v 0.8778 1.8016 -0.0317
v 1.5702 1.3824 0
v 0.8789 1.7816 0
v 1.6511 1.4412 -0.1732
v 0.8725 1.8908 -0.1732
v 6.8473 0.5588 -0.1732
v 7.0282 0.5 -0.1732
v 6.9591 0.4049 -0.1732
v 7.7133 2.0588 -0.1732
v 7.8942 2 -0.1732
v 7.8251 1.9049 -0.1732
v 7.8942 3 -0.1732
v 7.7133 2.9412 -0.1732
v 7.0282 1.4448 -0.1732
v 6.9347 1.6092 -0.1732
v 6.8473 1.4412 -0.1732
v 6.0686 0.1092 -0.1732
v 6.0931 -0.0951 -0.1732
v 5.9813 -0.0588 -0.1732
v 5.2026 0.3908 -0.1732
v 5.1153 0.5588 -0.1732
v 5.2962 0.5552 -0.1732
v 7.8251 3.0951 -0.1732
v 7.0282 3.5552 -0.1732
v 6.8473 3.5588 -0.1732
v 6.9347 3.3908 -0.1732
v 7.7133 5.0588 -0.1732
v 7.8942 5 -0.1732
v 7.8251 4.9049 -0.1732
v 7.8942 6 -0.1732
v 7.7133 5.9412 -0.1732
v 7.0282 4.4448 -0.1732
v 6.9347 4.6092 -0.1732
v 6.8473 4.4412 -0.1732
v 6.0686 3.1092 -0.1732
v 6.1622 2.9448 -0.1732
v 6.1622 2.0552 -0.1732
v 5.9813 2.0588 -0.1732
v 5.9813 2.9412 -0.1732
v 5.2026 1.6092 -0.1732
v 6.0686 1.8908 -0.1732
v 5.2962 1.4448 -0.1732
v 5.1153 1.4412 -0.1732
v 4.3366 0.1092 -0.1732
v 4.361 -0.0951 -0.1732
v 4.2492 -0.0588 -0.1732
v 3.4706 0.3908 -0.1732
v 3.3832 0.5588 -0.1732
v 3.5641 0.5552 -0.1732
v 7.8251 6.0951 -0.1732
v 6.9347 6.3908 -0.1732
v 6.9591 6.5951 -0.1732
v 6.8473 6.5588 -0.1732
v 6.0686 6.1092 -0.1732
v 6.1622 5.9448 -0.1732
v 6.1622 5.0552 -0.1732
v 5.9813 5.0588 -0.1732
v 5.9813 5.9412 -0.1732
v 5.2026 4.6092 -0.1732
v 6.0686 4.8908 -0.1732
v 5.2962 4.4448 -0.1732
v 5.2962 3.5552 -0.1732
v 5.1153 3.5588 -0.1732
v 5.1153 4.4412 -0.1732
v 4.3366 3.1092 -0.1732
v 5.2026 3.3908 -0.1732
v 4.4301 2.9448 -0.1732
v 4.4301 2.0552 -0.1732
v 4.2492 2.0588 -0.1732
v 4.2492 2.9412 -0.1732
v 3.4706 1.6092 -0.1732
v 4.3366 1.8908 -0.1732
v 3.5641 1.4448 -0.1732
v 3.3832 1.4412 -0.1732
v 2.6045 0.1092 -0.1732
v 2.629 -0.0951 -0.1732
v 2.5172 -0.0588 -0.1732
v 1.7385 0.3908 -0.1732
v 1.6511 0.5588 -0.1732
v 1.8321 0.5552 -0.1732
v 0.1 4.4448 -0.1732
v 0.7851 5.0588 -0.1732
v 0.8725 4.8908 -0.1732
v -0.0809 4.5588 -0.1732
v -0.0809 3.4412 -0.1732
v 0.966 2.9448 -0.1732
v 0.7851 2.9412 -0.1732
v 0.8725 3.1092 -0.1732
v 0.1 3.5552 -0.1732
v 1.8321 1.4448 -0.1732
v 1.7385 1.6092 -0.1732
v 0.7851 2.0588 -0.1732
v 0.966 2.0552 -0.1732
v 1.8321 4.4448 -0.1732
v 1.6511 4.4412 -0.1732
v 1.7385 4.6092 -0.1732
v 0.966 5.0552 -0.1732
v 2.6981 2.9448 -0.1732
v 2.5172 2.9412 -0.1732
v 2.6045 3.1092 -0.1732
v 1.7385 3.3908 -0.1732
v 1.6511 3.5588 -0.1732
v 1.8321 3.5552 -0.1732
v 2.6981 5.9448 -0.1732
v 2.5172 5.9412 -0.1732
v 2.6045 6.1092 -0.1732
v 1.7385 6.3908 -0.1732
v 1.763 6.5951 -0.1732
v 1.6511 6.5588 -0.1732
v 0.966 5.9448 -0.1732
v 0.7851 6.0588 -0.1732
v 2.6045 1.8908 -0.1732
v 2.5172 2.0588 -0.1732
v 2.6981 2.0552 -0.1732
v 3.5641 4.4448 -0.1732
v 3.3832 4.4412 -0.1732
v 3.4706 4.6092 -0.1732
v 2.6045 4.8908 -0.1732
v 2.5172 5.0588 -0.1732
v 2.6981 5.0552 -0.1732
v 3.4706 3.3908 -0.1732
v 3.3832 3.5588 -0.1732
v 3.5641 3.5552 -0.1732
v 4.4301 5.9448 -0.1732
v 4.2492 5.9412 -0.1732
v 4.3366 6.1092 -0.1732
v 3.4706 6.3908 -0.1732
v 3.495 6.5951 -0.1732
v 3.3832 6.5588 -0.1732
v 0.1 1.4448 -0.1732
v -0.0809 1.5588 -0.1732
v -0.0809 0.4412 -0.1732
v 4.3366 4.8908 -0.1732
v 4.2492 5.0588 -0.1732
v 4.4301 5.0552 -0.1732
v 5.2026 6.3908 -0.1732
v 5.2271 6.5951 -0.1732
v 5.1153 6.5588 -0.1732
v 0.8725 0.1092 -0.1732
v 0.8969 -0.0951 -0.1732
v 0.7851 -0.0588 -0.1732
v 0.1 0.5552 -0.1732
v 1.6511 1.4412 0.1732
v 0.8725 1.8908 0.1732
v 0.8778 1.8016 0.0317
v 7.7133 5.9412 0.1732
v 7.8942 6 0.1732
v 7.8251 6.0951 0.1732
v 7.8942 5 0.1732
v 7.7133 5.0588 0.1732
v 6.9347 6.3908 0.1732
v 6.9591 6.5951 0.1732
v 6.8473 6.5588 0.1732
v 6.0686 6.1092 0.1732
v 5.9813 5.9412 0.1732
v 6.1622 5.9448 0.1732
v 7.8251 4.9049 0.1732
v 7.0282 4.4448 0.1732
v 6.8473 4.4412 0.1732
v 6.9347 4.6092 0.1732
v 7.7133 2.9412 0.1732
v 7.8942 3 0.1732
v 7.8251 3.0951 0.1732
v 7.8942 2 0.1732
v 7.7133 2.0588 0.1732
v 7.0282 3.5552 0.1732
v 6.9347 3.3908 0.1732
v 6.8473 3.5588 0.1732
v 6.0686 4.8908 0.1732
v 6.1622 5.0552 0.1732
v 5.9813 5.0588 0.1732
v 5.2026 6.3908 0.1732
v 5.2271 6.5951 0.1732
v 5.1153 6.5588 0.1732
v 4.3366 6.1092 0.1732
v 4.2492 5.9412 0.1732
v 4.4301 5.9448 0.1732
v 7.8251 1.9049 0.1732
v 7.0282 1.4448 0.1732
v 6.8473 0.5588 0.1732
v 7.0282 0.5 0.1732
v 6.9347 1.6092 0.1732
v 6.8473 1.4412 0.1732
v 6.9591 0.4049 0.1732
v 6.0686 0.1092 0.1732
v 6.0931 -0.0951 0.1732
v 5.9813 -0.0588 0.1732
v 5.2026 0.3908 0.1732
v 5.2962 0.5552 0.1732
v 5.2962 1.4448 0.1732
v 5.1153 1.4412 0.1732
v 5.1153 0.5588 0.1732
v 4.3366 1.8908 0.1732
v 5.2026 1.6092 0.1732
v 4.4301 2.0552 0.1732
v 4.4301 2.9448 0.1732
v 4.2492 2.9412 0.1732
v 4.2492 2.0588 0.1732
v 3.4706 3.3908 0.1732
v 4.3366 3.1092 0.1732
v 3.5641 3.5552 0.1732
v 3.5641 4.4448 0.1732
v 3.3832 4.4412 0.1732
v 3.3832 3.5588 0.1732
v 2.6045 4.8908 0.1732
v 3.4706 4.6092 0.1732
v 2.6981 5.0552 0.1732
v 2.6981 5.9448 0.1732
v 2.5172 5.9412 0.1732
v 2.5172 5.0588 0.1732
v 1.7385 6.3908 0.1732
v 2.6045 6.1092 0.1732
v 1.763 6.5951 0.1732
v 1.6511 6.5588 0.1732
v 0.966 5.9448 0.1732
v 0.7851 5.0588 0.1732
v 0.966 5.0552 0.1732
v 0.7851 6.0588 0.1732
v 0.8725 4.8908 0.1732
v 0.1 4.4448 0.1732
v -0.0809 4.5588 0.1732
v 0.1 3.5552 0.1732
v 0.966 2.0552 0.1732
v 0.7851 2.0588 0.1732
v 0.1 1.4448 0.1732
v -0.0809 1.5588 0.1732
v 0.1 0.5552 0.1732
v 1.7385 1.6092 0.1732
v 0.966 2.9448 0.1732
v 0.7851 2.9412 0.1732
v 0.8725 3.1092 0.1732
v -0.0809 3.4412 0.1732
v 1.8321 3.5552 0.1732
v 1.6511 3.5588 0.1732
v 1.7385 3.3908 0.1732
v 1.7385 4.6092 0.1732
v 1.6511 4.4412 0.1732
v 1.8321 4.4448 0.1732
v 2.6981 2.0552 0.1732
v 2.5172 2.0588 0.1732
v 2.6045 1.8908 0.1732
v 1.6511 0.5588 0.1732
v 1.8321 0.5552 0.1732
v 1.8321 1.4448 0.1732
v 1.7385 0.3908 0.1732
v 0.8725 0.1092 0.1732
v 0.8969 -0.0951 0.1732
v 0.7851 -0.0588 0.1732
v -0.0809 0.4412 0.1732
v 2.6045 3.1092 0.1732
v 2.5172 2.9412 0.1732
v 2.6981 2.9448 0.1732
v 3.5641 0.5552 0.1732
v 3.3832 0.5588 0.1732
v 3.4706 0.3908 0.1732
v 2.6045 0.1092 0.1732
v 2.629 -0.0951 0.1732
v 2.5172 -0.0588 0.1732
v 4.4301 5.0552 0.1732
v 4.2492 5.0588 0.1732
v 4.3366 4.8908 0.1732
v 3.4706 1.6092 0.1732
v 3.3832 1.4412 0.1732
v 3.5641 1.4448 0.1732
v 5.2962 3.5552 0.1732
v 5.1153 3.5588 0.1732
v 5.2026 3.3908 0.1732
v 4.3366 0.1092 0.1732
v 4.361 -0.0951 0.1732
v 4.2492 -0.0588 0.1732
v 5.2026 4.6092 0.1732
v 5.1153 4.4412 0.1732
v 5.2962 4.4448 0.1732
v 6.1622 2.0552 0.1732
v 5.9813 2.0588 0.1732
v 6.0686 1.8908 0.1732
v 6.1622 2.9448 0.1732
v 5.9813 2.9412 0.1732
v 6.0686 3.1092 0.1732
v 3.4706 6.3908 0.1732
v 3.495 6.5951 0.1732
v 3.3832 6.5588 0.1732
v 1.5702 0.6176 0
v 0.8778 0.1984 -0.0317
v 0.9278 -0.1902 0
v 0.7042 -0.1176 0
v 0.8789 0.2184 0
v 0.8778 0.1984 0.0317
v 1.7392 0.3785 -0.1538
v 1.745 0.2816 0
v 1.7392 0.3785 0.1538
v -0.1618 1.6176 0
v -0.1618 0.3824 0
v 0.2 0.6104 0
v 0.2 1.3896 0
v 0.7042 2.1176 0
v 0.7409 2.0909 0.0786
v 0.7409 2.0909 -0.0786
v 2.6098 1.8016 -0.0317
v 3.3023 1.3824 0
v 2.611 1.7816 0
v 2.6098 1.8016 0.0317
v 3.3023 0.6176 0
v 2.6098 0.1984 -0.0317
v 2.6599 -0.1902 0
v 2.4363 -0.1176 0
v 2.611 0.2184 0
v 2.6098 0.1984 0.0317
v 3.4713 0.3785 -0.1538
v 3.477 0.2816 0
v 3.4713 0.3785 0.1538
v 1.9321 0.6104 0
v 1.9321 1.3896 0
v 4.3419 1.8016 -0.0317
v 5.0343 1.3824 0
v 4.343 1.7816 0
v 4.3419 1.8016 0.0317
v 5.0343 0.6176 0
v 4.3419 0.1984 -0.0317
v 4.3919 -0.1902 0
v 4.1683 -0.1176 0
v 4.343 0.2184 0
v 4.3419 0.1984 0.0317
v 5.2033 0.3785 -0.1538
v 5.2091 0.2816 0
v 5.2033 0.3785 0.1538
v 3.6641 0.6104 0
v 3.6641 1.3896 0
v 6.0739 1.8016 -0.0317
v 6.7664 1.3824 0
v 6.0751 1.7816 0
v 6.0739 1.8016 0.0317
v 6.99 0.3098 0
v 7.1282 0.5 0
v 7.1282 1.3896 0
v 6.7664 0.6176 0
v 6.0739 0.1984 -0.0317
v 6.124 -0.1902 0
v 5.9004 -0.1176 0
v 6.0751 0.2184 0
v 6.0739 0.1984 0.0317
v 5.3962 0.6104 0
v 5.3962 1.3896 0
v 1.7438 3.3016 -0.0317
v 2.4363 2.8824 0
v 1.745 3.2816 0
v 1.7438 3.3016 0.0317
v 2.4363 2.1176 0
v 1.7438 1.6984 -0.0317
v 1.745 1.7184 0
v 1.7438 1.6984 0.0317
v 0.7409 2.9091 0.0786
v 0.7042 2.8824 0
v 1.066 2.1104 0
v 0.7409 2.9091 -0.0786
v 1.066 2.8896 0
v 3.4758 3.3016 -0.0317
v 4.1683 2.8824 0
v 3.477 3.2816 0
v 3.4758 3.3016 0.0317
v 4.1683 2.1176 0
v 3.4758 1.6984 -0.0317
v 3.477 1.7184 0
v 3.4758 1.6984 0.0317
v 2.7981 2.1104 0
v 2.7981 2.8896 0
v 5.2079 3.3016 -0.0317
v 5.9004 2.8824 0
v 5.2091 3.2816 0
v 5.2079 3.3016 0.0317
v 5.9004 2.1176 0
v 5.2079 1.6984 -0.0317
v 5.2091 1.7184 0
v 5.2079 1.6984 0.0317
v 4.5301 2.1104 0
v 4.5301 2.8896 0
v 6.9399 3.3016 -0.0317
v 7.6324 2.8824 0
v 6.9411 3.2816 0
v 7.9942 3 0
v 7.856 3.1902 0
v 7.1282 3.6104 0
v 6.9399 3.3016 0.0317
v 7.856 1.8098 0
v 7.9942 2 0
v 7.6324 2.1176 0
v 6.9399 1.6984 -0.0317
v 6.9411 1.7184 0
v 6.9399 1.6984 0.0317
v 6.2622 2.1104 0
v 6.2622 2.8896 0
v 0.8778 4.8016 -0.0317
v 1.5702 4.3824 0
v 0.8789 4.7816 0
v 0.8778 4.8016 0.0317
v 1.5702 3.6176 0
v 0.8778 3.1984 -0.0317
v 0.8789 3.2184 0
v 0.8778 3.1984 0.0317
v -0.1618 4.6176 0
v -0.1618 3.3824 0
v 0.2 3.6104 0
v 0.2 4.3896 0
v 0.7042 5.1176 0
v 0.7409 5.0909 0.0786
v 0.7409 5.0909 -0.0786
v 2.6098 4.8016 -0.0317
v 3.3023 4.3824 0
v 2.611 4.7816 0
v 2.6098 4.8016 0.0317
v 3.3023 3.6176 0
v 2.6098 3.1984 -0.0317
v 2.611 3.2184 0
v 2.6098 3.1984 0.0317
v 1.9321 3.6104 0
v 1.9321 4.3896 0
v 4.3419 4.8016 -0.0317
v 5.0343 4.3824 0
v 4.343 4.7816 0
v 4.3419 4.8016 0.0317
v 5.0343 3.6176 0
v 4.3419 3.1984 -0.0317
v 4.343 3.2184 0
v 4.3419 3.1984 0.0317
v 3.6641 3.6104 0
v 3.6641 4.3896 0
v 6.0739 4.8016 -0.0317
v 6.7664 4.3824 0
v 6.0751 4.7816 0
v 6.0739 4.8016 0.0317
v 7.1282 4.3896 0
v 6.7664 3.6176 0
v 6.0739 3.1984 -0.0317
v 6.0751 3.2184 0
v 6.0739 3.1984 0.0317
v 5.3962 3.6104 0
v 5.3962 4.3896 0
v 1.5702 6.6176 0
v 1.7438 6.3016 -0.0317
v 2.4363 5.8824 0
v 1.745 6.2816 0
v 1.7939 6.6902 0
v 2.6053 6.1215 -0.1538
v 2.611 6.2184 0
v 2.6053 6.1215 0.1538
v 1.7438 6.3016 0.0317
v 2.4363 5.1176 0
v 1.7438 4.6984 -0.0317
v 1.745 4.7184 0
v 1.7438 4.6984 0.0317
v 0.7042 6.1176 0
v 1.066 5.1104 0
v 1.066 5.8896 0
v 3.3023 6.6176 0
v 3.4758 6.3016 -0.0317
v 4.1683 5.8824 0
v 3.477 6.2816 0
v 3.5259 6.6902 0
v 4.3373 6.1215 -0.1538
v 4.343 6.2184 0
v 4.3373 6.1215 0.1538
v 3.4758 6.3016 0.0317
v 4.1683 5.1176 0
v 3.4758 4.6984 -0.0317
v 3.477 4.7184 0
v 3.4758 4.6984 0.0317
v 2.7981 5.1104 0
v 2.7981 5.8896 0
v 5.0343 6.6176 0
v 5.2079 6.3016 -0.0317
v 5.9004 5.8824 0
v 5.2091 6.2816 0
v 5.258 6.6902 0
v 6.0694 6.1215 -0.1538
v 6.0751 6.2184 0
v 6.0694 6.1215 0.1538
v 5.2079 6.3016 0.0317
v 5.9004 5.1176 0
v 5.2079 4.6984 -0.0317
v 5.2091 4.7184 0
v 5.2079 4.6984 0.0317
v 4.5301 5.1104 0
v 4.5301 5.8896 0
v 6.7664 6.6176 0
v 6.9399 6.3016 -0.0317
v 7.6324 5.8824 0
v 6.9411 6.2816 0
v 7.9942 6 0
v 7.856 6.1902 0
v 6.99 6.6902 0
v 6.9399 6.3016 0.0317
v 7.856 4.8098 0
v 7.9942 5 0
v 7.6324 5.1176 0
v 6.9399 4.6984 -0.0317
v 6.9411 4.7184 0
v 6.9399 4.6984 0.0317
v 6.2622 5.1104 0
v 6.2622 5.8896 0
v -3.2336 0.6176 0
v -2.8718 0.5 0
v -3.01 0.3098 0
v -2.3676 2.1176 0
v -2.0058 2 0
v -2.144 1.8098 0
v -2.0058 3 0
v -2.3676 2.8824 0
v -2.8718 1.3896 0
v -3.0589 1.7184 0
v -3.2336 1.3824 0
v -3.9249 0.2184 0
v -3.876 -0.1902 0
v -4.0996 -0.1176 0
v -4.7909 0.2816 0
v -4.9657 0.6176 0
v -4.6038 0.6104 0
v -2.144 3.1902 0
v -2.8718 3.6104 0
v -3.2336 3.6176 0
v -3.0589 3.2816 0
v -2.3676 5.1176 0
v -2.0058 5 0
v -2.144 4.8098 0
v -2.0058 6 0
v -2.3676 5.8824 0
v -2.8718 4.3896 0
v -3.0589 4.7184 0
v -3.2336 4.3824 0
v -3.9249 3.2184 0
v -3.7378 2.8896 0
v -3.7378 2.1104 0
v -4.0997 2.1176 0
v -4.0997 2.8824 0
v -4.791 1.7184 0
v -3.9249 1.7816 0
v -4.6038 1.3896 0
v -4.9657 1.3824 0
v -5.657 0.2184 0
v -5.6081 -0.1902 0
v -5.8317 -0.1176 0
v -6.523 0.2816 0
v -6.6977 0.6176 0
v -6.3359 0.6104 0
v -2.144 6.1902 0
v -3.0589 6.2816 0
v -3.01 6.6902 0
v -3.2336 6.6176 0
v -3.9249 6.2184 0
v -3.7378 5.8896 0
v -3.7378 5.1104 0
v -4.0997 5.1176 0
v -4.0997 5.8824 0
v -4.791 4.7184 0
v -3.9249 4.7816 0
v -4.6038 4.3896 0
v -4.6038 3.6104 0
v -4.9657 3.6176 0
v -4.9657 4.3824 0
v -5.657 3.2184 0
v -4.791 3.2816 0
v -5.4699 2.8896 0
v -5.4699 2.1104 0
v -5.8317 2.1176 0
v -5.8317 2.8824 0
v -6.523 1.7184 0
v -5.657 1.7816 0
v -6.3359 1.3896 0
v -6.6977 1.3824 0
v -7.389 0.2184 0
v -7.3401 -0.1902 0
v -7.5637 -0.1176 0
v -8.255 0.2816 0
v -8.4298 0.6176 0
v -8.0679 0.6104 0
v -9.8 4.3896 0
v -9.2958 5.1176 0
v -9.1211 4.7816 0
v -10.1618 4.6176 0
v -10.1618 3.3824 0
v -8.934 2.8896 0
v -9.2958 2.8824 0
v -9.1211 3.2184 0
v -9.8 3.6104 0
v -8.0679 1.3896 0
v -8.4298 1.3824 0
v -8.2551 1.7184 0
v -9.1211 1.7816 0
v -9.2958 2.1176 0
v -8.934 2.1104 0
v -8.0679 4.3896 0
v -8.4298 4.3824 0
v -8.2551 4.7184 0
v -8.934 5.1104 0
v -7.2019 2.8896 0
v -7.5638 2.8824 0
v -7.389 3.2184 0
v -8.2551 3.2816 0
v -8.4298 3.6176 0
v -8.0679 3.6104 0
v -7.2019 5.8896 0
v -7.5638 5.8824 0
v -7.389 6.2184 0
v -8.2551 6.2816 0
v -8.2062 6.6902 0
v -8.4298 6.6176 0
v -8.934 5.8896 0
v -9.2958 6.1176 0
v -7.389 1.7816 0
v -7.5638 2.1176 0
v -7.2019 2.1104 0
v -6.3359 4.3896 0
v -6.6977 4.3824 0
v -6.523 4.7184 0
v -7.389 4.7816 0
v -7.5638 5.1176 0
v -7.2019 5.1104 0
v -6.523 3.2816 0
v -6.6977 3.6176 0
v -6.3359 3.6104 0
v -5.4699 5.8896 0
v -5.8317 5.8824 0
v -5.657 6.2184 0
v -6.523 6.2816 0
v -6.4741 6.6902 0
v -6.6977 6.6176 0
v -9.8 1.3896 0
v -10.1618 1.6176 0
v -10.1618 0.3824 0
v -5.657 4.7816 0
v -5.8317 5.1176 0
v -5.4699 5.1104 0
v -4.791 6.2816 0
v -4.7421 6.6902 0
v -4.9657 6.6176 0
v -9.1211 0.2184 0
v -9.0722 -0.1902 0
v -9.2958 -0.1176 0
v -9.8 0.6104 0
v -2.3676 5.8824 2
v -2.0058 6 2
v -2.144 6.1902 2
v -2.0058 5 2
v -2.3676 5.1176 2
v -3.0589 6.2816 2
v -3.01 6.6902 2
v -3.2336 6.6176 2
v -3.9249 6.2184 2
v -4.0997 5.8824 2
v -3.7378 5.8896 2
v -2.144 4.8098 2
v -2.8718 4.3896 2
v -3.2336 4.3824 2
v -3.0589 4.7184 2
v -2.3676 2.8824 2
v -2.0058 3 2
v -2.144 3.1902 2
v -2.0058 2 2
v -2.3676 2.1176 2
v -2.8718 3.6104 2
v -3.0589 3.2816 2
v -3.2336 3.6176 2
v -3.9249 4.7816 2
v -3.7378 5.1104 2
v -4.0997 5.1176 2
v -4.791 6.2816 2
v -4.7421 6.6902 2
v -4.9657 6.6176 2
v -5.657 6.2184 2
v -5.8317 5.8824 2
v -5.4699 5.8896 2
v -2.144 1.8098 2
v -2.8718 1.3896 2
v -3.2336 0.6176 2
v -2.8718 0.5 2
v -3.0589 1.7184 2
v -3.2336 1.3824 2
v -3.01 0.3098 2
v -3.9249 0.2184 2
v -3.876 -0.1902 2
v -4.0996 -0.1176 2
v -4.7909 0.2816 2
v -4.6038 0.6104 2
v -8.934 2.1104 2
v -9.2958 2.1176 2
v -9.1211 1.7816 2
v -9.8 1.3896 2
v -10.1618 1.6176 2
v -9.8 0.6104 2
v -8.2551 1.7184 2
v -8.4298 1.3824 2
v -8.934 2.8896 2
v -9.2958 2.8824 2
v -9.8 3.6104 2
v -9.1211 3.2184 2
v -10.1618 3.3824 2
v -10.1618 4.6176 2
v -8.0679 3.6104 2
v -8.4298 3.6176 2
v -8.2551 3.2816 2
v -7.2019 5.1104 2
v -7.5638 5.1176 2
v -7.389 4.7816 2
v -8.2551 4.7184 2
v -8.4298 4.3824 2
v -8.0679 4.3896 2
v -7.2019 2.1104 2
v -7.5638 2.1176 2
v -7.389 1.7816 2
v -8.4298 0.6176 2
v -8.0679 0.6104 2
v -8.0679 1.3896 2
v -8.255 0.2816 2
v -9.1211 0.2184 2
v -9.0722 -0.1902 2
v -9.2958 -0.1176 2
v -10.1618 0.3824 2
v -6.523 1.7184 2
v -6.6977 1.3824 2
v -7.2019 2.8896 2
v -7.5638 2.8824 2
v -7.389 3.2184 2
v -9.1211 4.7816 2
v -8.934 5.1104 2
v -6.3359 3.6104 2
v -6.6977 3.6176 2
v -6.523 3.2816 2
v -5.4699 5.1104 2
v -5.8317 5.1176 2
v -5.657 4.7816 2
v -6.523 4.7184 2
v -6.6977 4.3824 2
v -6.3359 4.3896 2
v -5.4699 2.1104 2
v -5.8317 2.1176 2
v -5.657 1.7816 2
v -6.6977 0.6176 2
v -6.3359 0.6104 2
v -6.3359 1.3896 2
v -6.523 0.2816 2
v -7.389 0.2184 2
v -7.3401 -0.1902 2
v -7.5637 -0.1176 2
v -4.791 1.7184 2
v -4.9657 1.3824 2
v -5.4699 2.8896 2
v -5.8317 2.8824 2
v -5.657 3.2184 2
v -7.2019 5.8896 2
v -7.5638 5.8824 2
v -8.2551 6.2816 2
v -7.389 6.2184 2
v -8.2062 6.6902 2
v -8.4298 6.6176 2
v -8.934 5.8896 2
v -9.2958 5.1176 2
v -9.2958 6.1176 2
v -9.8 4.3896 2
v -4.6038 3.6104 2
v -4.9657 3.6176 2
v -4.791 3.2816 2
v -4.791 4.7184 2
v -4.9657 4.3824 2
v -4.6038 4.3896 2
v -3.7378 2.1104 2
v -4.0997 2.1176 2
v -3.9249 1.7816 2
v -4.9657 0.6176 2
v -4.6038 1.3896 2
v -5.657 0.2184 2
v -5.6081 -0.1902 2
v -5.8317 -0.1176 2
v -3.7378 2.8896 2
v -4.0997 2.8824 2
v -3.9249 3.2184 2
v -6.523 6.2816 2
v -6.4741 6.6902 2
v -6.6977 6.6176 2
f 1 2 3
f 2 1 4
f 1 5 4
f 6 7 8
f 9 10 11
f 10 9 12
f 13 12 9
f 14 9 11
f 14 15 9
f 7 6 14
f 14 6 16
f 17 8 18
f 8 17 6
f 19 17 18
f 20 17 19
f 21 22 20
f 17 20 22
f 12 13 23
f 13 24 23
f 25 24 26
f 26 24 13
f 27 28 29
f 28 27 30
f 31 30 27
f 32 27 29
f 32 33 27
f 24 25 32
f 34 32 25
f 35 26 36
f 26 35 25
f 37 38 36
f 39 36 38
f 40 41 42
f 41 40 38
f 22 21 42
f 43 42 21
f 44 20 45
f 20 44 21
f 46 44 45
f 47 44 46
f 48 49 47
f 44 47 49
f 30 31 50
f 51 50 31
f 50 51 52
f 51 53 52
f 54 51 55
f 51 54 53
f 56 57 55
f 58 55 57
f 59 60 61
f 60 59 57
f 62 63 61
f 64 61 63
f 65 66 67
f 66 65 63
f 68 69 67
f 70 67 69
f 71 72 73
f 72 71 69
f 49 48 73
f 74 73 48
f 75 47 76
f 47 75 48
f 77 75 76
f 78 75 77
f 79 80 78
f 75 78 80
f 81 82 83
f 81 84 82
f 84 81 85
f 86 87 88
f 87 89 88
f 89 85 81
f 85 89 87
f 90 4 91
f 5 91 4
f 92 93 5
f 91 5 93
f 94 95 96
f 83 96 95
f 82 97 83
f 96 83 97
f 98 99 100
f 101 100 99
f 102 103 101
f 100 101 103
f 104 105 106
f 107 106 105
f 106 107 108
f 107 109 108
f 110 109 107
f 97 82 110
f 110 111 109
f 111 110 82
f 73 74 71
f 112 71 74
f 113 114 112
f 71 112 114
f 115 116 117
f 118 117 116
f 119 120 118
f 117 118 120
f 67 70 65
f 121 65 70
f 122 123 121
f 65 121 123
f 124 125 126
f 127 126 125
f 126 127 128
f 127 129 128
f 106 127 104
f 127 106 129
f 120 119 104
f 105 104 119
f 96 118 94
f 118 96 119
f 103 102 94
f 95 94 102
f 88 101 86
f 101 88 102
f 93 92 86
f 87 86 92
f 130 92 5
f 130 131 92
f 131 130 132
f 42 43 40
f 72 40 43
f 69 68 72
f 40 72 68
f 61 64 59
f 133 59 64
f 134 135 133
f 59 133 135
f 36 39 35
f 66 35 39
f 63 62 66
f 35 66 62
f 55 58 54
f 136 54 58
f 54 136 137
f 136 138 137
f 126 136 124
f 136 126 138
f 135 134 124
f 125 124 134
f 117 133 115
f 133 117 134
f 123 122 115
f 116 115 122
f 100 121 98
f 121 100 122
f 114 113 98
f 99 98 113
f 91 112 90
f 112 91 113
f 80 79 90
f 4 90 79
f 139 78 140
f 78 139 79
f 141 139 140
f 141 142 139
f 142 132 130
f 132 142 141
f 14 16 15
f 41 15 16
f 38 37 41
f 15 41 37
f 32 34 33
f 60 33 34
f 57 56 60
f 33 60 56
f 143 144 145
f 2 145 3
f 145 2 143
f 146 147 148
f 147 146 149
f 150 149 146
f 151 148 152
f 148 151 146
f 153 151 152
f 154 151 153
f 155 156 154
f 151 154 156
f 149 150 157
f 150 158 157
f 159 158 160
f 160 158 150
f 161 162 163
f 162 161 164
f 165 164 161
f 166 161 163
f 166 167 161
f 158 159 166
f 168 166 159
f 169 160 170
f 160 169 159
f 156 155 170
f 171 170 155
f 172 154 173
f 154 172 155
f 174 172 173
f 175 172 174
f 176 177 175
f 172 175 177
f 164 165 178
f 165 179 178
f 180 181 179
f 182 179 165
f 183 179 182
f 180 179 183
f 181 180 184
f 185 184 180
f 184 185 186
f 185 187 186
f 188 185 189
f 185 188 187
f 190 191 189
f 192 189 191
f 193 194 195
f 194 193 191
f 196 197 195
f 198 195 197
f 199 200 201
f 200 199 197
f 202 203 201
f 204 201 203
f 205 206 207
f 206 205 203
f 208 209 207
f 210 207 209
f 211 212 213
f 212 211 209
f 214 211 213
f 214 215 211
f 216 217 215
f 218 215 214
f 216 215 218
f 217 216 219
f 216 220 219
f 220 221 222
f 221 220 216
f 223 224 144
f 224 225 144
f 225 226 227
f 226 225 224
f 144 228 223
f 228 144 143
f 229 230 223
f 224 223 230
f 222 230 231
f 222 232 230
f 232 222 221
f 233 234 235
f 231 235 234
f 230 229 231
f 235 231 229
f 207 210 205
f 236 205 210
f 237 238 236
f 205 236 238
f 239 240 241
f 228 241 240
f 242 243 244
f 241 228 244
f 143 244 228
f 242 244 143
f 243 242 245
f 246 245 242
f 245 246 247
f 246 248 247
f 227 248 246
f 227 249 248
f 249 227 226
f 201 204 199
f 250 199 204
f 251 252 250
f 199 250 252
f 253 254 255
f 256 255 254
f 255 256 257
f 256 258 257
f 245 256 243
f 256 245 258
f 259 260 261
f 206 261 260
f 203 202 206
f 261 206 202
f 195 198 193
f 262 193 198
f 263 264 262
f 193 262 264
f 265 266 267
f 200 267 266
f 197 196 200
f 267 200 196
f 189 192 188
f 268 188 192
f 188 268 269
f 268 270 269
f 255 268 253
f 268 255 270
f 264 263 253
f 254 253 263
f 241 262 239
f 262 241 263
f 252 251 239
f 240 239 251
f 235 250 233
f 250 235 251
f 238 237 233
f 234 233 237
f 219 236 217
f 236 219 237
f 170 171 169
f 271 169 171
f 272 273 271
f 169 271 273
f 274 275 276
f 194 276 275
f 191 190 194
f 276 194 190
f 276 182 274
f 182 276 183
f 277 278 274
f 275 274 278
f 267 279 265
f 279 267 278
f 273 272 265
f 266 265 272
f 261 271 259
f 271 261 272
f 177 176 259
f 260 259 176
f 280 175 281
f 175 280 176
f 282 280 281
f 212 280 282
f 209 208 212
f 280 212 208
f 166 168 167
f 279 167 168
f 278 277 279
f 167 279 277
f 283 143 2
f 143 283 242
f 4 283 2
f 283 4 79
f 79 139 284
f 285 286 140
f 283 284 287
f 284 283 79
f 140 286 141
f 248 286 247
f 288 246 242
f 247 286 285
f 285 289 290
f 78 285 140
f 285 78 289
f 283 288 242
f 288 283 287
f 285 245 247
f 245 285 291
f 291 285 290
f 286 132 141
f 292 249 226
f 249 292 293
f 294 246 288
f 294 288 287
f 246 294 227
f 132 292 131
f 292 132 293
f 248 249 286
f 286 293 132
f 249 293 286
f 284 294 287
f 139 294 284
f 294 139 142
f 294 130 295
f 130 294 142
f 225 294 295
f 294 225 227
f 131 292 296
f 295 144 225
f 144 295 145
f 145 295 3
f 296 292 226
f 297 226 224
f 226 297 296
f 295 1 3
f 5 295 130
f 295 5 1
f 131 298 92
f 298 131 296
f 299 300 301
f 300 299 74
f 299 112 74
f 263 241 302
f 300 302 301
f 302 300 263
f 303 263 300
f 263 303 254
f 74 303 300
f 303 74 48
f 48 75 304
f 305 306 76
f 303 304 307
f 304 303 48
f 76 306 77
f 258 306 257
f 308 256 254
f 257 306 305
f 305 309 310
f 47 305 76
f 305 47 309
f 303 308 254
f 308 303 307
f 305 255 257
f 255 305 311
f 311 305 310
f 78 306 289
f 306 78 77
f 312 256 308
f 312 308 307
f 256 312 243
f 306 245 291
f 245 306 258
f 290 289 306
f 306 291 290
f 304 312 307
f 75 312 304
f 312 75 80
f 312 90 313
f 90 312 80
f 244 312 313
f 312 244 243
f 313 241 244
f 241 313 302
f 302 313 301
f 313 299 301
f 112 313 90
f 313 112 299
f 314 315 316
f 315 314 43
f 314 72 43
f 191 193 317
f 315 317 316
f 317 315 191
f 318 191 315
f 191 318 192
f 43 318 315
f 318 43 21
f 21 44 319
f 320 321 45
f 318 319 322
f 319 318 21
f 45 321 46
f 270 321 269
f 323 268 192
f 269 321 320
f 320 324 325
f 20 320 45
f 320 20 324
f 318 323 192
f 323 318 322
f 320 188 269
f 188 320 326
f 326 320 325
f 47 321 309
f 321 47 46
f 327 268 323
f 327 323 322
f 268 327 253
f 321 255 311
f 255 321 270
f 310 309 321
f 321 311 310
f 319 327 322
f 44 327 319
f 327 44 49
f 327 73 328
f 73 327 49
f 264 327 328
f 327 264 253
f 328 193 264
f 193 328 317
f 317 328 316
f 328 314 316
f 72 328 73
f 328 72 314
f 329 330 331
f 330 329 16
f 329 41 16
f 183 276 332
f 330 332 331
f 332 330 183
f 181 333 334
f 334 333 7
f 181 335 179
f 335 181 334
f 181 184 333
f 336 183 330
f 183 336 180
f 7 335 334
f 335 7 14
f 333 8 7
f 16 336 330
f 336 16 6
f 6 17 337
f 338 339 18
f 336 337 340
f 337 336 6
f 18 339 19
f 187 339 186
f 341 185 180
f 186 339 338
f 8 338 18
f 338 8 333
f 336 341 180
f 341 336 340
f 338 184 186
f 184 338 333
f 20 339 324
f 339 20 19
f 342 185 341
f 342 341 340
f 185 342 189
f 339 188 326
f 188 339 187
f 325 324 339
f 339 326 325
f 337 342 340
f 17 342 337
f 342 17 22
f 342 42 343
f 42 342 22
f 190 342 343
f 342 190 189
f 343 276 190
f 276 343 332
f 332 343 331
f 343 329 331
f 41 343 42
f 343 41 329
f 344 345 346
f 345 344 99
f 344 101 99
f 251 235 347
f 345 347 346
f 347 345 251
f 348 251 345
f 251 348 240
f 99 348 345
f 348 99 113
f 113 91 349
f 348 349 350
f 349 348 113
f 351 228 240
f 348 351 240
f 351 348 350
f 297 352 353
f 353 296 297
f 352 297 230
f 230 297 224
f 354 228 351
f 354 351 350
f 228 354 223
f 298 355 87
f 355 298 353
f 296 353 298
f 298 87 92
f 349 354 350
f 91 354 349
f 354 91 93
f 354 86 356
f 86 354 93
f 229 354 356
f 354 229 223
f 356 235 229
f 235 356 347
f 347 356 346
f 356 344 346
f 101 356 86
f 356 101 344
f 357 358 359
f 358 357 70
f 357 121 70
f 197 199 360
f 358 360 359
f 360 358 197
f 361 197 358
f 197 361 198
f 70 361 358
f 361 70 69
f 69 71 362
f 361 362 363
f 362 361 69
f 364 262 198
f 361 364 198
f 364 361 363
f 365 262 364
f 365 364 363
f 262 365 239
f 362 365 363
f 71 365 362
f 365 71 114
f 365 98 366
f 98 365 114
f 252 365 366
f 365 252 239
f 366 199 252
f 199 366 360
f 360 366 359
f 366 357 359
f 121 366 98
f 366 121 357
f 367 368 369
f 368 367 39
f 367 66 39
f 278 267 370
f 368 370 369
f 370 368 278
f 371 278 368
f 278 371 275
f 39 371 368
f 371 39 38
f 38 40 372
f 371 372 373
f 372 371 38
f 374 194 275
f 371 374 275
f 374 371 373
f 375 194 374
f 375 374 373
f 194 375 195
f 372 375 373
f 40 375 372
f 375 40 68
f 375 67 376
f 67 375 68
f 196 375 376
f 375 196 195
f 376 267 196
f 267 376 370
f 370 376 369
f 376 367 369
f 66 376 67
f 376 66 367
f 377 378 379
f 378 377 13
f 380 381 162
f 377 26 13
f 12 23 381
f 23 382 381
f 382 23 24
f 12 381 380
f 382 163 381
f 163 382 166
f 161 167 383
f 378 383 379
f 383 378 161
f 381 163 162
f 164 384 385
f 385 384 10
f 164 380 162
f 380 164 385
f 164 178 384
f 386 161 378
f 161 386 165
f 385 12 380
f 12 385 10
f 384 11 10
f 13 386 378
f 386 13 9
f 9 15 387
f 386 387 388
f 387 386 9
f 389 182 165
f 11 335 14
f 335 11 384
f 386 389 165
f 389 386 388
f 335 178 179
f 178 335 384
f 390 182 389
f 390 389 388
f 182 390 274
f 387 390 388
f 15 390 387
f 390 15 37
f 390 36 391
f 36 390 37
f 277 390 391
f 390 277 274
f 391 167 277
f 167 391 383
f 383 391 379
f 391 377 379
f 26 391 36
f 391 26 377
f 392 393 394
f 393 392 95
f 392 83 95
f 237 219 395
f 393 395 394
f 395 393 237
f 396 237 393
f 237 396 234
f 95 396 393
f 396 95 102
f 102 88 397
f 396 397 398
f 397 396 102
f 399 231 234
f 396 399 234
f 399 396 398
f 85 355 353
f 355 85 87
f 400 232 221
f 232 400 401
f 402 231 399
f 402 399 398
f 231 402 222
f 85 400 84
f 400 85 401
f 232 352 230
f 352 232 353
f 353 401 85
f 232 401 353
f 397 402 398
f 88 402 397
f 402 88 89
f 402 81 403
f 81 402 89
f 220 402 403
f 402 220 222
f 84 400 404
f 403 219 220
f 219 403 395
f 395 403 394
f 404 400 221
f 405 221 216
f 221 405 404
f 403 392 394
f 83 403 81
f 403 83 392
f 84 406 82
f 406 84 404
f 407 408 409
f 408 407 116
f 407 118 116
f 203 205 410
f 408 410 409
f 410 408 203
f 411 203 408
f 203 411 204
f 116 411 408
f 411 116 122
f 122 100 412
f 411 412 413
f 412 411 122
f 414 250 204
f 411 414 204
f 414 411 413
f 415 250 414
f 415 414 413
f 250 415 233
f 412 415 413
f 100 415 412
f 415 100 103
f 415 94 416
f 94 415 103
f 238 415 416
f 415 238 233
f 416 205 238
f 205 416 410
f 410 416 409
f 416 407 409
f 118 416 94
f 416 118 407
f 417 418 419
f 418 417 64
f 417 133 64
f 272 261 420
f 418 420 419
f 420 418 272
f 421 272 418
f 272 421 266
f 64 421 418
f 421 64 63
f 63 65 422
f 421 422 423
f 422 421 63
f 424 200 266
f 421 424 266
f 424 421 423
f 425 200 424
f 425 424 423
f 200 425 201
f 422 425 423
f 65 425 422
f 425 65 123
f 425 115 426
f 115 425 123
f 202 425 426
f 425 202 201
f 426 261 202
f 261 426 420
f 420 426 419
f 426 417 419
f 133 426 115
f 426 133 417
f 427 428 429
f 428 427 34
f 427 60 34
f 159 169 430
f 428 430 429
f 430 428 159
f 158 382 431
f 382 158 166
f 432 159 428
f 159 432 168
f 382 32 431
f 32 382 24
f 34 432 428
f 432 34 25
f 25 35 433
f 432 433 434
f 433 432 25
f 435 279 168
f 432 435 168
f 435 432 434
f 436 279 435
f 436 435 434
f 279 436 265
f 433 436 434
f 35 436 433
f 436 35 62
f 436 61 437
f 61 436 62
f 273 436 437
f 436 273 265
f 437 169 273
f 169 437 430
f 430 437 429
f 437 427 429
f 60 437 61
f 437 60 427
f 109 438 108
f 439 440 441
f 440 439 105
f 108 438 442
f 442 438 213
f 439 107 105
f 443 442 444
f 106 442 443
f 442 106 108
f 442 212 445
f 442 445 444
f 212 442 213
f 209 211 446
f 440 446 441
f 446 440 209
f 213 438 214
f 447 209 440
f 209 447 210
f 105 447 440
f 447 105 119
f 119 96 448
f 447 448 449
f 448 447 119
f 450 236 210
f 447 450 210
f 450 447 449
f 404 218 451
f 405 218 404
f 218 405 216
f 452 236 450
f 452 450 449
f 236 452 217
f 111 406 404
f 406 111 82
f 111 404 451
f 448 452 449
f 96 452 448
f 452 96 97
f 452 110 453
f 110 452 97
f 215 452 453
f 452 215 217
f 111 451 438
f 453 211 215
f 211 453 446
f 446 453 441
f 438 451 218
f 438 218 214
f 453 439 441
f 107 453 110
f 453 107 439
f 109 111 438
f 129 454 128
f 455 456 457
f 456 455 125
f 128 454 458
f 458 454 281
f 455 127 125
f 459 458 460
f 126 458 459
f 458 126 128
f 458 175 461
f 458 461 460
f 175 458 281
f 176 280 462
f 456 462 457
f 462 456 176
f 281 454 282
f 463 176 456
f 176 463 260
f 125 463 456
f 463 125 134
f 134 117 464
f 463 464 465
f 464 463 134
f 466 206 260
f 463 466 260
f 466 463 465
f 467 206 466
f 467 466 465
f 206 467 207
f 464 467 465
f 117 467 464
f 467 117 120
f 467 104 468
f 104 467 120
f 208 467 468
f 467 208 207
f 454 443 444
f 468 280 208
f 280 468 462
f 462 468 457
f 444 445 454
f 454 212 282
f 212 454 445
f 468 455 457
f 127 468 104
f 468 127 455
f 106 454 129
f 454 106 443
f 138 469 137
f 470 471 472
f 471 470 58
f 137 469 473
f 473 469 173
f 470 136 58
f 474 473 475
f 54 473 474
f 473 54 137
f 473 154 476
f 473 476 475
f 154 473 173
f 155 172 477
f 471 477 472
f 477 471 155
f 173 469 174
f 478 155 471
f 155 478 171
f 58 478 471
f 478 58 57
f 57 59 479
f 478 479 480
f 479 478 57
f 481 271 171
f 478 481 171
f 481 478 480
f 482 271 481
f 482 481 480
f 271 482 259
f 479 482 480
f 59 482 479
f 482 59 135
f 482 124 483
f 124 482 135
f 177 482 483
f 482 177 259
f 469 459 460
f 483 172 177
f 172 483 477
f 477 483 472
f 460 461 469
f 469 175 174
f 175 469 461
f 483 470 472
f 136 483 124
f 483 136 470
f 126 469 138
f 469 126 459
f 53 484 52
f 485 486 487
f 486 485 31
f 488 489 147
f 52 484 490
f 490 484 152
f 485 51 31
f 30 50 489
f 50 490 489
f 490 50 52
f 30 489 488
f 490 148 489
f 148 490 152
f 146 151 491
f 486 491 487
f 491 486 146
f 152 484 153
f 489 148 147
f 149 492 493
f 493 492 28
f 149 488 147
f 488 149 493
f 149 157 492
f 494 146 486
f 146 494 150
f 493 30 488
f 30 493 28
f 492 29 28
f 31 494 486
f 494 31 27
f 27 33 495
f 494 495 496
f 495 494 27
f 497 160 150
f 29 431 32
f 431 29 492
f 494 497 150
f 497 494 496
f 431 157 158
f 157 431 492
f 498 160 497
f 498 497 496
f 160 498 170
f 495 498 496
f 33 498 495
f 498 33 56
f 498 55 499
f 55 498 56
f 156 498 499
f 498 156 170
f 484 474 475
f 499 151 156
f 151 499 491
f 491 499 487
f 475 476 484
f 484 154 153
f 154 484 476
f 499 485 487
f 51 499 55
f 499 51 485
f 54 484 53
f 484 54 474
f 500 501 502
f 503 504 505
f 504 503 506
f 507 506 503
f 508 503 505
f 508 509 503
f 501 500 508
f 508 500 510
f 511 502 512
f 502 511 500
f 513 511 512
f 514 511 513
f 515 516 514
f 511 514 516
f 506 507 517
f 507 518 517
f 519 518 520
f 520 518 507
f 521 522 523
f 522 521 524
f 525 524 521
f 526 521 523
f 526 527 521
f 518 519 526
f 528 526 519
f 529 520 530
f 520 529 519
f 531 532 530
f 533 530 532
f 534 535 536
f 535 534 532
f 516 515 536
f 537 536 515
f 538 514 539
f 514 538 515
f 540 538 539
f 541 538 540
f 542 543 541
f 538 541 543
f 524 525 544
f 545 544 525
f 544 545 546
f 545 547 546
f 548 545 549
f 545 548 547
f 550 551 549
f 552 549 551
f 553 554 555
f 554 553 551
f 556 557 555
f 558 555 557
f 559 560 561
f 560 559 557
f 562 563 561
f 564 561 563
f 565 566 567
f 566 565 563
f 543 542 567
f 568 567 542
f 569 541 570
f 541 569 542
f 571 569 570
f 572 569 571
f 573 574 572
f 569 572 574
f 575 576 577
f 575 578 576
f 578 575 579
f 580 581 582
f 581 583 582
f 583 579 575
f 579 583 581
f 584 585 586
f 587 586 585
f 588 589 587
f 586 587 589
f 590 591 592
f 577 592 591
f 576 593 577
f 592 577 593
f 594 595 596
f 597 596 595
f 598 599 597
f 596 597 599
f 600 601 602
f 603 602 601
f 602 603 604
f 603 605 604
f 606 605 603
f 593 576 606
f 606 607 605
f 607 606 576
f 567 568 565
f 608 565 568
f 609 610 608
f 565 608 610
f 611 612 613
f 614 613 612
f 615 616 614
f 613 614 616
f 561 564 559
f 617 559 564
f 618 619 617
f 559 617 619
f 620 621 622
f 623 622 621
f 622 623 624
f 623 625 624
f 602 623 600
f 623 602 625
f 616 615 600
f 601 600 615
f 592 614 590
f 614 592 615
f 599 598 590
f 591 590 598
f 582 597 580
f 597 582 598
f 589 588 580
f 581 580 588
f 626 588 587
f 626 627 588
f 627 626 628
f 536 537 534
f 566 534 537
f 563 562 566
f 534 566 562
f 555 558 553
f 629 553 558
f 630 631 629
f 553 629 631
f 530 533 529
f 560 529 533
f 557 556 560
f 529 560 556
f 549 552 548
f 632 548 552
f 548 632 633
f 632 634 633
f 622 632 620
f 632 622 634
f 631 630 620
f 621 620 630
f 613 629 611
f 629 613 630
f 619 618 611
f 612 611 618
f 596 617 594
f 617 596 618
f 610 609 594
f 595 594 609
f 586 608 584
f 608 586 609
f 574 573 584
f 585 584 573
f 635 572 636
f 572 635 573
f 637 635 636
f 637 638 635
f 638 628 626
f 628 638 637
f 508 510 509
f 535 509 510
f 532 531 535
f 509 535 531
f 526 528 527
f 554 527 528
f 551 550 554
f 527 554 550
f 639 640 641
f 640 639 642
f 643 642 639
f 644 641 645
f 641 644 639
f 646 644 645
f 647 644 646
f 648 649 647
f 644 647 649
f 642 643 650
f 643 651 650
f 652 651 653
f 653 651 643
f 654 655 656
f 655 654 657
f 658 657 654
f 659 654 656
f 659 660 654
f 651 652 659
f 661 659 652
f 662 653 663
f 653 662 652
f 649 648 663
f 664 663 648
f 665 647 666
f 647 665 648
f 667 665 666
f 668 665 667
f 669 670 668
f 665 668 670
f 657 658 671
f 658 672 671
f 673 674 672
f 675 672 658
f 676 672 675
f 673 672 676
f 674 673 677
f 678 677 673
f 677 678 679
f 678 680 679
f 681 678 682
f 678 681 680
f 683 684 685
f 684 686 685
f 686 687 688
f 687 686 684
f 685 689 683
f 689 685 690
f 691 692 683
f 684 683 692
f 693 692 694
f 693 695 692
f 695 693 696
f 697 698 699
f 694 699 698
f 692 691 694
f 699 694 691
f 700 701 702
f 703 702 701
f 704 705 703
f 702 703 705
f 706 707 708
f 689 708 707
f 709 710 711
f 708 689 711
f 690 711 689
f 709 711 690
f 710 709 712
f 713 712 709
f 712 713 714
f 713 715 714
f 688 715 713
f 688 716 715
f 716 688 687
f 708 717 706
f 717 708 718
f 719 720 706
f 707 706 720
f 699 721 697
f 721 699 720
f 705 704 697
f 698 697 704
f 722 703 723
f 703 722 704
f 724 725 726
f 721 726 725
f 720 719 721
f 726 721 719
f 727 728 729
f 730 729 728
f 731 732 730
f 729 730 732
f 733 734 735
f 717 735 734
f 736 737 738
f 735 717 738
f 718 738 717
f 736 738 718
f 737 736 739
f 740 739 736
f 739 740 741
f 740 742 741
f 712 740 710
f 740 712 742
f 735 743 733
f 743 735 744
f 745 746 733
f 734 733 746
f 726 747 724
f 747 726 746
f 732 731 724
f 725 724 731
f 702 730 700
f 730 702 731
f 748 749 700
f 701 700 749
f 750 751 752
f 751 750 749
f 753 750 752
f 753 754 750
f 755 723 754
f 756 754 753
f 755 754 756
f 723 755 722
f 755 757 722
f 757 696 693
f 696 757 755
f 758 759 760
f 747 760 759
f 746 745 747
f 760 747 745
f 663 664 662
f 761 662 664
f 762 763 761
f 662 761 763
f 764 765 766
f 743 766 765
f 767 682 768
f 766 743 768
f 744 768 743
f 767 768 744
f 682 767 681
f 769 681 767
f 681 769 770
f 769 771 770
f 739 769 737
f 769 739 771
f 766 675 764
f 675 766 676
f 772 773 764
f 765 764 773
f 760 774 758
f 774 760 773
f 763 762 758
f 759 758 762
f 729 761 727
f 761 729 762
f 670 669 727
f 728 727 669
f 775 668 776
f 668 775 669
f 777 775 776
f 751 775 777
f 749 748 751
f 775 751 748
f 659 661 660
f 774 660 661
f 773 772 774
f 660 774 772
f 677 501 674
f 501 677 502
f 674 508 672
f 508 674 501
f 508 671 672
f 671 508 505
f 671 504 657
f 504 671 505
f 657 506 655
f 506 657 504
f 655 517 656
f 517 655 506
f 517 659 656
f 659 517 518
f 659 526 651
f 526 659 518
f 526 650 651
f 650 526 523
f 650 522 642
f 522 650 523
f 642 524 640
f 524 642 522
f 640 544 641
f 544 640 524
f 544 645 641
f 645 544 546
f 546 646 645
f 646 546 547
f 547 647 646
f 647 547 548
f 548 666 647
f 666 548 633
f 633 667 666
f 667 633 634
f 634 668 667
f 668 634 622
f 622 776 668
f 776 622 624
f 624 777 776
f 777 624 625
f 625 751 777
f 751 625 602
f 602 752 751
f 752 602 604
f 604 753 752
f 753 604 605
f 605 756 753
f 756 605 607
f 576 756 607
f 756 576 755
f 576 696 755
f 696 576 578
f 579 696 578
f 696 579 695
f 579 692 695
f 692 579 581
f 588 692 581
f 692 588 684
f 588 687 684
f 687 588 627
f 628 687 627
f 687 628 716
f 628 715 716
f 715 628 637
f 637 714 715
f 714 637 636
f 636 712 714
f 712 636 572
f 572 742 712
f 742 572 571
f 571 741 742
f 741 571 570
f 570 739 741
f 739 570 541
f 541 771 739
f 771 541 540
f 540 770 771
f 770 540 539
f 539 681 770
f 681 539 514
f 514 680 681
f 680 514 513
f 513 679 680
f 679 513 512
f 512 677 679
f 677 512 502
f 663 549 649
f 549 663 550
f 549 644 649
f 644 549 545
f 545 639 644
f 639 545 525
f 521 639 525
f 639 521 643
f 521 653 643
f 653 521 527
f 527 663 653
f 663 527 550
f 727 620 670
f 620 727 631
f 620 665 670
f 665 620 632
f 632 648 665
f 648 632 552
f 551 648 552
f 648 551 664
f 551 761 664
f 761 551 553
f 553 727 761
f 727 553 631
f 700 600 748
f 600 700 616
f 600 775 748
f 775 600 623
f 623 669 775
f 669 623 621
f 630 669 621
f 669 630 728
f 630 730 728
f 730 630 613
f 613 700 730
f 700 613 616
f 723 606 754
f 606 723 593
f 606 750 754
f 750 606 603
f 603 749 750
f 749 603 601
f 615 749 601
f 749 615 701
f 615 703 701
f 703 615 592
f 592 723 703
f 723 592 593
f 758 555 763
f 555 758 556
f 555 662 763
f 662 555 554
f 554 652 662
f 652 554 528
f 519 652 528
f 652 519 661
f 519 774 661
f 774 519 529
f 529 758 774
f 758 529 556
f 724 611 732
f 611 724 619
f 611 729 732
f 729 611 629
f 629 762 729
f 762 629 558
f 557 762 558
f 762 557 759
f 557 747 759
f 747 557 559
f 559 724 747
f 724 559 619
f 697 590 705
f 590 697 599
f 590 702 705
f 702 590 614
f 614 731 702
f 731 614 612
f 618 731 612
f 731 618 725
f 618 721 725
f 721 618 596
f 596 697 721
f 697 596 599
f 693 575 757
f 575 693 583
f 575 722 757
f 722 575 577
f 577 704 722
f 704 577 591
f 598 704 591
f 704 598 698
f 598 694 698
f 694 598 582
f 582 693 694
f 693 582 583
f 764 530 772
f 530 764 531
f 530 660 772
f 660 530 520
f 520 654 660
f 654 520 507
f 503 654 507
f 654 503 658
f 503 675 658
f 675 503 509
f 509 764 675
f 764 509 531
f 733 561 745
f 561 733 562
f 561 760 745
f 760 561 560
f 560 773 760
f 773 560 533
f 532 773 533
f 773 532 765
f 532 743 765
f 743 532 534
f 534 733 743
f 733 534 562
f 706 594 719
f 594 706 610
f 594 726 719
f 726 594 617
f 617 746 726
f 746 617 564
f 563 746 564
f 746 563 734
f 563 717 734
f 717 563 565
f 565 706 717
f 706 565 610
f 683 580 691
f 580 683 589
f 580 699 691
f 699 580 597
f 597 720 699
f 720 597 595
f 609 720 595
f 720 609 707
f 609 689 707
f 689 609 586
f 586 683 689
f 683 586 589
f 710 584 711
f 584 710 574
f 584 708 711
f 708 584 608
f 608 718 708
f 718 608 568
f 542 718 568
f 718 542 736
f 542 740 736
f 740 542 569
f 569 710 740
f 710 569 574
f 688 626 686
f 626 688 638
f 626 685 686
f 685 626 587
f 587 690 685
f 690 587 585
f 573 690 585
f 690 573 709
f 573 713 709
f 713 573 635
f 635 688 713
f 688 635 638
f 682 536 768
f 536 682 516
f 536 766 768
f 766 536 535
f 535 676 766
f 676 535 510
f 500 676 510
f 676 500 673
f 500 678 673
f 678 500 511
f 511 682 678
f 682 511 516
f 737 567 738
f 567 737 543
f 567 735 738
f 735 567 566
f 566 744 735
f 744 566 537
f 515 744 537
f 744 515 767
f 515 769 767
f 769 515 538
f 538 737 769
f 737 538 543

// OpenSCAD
module honeycomb_cell_round(radius, edge_radius) {
    width=radius * cos(30);
    union() {
        hull() {
            translate([0, radius, 0]) sphere(edge_radius);
            translate([radius * cos(30), radius * sin(30), 0]) sphere(edge_radius);
        }
        hull() {
            translate([radius * cos(30), radius * sin(30), 0]) sphere(edge_radius);
            translate([radius * cos(30), -radius * sin(30), 0]) sphere(edge_radius);
        }
        hull() {
            translate([radius * cos(30), -radius * sin(30), 0]) sphere(edge_radius);
            translate([0, -radius, 0]) sphere(edge_radius);
        }
        hull() {
            translate([0, -radius, 0]) sphere(edge_radius);
            translate([-radius * cos(30), -radius * sin(30), 0]) sphere(edge_radius);
        }
        hull() {
            translate([-radius * cos(30), -radius * sin(30), 0]) sphere(edge_radius);
            translate([-radius * cos(30), radius * sin(30), 0]) sphere(edge_radius);

        }
        hull() {
            translate([-radius * cos(30), radius * sin(30), 0]) sphere(edge_radius);
            translate([0, radius, 0]) sphere(edge_radius);
        }
    }          
}
module honeycomb_cell_plane(radius, edge_radius) {
    union() {
        hull() {
            translate([0, radius, 0]) circle(edge_radius);
            translate([radius * cos(30), radius * sin(30), 0]) circle(edge_radius);
        }
        hull() {
            translate([radius * cos(30), radius * sin(30), 0]) circle(edge_radius);
            translate([radius * cos(30), -radius * sin(30), 0]) circle(edge_radius);
        }
        hull() {
            translate([radius * cos(30), -radius * sin(30), 0]) circle(edge_radius);
            translate([0, -radius, 0]) circle(edge_radius);
        }
        hull() {
            translate([0, -radius, 0]) circle(edge_radius);
            translate([-radius * cos(30), -radius * sin(30), 0]) circle(edge_radius);
        }
        hull() {
            translate([-radius * cos(30), -radius * sin(30), 0]) circle(edge_radius);
            translate([-radius * cos(30), radius * sin(30), 0]) circle(edge_radius);

        }
        hull() {
            translate([-radius * cos(30), radius * sin(30), 0]) circle(edge_radius);
            translate([0, radius, 0]) circle(edge_radius);
        }
    }          
}
module honeycomb_round(edge_count, unit_radius, edge_radius, center=false) {
    module hexagon_line(edge_count, unit_radius, edge_radius) {
        for(i = [0: edge_count-1]) {
            translate([unit_radius*cos(30)*2*i, 0, 0]) honeycomb_cell_round(unit_radius, edge_radius);
        }
    }
    module hexagon_mesh_base(edge_count, unit_radius, edge_radius) {
        for (i = [0: edge_count-1]) {
            if (i % 2==1) {
                translate([unit_radius*cos(30),i*1.5*unit_radius,  0]) hexagon_line(edge_count, unit_radius, edge_radius);
            } else {
                translate([0,i*1.5*unit_radius, 0]) hexagon_line(edge_count, unit_radius, edge_radius);
            }
        }
    }
    if (center){
    } else {
        translate([cos(30)*unit_radius, unit_radius, 0]) hexagon_mesh_base(edge_count, unit_radius, edge_radius);
    }
}
module honeycomb_plane(edge_count, unit_radius, edge_radius, center=false) {
    module hexagon_line(edge_count, unit_radius, edge_radius) {
        for(i = [0: edge_count-1]) {
            translate([unit_radius*cos(30)*2*i, 0, 0]) honeycomb_cell_plane(unit_radius, edge_radius);
        }
    }
    module hexagon_mesh_base(edge_count, unit_radius, edge_radius) {
        for (i = [0: edge_count-1]) {
            if (i % 2==1) {
                translate([unit_radius*cos(30),i*1.5*unit_radius,  0]) hexagon_line(edge_count, unit_radius, edge_radius);
            } else {
                translate([0,i*1.5*unit_radius, 0]) hexagon_line(edge_count, unit_radius, edge_radius);
            }
        }
    }
    if (center){
    } else {
        translate([cos(30)*unit_radius, unit_radius, 0]) hexagon_mesh_base(edge_count, unit_radius, edge_radius);
    }
}
honeycomb_round(4, 1, 0.2, false);
translate([-10, 0, 0]) linear_extrude(2) honeycomb_plane(4, 1, 0.2, false);
